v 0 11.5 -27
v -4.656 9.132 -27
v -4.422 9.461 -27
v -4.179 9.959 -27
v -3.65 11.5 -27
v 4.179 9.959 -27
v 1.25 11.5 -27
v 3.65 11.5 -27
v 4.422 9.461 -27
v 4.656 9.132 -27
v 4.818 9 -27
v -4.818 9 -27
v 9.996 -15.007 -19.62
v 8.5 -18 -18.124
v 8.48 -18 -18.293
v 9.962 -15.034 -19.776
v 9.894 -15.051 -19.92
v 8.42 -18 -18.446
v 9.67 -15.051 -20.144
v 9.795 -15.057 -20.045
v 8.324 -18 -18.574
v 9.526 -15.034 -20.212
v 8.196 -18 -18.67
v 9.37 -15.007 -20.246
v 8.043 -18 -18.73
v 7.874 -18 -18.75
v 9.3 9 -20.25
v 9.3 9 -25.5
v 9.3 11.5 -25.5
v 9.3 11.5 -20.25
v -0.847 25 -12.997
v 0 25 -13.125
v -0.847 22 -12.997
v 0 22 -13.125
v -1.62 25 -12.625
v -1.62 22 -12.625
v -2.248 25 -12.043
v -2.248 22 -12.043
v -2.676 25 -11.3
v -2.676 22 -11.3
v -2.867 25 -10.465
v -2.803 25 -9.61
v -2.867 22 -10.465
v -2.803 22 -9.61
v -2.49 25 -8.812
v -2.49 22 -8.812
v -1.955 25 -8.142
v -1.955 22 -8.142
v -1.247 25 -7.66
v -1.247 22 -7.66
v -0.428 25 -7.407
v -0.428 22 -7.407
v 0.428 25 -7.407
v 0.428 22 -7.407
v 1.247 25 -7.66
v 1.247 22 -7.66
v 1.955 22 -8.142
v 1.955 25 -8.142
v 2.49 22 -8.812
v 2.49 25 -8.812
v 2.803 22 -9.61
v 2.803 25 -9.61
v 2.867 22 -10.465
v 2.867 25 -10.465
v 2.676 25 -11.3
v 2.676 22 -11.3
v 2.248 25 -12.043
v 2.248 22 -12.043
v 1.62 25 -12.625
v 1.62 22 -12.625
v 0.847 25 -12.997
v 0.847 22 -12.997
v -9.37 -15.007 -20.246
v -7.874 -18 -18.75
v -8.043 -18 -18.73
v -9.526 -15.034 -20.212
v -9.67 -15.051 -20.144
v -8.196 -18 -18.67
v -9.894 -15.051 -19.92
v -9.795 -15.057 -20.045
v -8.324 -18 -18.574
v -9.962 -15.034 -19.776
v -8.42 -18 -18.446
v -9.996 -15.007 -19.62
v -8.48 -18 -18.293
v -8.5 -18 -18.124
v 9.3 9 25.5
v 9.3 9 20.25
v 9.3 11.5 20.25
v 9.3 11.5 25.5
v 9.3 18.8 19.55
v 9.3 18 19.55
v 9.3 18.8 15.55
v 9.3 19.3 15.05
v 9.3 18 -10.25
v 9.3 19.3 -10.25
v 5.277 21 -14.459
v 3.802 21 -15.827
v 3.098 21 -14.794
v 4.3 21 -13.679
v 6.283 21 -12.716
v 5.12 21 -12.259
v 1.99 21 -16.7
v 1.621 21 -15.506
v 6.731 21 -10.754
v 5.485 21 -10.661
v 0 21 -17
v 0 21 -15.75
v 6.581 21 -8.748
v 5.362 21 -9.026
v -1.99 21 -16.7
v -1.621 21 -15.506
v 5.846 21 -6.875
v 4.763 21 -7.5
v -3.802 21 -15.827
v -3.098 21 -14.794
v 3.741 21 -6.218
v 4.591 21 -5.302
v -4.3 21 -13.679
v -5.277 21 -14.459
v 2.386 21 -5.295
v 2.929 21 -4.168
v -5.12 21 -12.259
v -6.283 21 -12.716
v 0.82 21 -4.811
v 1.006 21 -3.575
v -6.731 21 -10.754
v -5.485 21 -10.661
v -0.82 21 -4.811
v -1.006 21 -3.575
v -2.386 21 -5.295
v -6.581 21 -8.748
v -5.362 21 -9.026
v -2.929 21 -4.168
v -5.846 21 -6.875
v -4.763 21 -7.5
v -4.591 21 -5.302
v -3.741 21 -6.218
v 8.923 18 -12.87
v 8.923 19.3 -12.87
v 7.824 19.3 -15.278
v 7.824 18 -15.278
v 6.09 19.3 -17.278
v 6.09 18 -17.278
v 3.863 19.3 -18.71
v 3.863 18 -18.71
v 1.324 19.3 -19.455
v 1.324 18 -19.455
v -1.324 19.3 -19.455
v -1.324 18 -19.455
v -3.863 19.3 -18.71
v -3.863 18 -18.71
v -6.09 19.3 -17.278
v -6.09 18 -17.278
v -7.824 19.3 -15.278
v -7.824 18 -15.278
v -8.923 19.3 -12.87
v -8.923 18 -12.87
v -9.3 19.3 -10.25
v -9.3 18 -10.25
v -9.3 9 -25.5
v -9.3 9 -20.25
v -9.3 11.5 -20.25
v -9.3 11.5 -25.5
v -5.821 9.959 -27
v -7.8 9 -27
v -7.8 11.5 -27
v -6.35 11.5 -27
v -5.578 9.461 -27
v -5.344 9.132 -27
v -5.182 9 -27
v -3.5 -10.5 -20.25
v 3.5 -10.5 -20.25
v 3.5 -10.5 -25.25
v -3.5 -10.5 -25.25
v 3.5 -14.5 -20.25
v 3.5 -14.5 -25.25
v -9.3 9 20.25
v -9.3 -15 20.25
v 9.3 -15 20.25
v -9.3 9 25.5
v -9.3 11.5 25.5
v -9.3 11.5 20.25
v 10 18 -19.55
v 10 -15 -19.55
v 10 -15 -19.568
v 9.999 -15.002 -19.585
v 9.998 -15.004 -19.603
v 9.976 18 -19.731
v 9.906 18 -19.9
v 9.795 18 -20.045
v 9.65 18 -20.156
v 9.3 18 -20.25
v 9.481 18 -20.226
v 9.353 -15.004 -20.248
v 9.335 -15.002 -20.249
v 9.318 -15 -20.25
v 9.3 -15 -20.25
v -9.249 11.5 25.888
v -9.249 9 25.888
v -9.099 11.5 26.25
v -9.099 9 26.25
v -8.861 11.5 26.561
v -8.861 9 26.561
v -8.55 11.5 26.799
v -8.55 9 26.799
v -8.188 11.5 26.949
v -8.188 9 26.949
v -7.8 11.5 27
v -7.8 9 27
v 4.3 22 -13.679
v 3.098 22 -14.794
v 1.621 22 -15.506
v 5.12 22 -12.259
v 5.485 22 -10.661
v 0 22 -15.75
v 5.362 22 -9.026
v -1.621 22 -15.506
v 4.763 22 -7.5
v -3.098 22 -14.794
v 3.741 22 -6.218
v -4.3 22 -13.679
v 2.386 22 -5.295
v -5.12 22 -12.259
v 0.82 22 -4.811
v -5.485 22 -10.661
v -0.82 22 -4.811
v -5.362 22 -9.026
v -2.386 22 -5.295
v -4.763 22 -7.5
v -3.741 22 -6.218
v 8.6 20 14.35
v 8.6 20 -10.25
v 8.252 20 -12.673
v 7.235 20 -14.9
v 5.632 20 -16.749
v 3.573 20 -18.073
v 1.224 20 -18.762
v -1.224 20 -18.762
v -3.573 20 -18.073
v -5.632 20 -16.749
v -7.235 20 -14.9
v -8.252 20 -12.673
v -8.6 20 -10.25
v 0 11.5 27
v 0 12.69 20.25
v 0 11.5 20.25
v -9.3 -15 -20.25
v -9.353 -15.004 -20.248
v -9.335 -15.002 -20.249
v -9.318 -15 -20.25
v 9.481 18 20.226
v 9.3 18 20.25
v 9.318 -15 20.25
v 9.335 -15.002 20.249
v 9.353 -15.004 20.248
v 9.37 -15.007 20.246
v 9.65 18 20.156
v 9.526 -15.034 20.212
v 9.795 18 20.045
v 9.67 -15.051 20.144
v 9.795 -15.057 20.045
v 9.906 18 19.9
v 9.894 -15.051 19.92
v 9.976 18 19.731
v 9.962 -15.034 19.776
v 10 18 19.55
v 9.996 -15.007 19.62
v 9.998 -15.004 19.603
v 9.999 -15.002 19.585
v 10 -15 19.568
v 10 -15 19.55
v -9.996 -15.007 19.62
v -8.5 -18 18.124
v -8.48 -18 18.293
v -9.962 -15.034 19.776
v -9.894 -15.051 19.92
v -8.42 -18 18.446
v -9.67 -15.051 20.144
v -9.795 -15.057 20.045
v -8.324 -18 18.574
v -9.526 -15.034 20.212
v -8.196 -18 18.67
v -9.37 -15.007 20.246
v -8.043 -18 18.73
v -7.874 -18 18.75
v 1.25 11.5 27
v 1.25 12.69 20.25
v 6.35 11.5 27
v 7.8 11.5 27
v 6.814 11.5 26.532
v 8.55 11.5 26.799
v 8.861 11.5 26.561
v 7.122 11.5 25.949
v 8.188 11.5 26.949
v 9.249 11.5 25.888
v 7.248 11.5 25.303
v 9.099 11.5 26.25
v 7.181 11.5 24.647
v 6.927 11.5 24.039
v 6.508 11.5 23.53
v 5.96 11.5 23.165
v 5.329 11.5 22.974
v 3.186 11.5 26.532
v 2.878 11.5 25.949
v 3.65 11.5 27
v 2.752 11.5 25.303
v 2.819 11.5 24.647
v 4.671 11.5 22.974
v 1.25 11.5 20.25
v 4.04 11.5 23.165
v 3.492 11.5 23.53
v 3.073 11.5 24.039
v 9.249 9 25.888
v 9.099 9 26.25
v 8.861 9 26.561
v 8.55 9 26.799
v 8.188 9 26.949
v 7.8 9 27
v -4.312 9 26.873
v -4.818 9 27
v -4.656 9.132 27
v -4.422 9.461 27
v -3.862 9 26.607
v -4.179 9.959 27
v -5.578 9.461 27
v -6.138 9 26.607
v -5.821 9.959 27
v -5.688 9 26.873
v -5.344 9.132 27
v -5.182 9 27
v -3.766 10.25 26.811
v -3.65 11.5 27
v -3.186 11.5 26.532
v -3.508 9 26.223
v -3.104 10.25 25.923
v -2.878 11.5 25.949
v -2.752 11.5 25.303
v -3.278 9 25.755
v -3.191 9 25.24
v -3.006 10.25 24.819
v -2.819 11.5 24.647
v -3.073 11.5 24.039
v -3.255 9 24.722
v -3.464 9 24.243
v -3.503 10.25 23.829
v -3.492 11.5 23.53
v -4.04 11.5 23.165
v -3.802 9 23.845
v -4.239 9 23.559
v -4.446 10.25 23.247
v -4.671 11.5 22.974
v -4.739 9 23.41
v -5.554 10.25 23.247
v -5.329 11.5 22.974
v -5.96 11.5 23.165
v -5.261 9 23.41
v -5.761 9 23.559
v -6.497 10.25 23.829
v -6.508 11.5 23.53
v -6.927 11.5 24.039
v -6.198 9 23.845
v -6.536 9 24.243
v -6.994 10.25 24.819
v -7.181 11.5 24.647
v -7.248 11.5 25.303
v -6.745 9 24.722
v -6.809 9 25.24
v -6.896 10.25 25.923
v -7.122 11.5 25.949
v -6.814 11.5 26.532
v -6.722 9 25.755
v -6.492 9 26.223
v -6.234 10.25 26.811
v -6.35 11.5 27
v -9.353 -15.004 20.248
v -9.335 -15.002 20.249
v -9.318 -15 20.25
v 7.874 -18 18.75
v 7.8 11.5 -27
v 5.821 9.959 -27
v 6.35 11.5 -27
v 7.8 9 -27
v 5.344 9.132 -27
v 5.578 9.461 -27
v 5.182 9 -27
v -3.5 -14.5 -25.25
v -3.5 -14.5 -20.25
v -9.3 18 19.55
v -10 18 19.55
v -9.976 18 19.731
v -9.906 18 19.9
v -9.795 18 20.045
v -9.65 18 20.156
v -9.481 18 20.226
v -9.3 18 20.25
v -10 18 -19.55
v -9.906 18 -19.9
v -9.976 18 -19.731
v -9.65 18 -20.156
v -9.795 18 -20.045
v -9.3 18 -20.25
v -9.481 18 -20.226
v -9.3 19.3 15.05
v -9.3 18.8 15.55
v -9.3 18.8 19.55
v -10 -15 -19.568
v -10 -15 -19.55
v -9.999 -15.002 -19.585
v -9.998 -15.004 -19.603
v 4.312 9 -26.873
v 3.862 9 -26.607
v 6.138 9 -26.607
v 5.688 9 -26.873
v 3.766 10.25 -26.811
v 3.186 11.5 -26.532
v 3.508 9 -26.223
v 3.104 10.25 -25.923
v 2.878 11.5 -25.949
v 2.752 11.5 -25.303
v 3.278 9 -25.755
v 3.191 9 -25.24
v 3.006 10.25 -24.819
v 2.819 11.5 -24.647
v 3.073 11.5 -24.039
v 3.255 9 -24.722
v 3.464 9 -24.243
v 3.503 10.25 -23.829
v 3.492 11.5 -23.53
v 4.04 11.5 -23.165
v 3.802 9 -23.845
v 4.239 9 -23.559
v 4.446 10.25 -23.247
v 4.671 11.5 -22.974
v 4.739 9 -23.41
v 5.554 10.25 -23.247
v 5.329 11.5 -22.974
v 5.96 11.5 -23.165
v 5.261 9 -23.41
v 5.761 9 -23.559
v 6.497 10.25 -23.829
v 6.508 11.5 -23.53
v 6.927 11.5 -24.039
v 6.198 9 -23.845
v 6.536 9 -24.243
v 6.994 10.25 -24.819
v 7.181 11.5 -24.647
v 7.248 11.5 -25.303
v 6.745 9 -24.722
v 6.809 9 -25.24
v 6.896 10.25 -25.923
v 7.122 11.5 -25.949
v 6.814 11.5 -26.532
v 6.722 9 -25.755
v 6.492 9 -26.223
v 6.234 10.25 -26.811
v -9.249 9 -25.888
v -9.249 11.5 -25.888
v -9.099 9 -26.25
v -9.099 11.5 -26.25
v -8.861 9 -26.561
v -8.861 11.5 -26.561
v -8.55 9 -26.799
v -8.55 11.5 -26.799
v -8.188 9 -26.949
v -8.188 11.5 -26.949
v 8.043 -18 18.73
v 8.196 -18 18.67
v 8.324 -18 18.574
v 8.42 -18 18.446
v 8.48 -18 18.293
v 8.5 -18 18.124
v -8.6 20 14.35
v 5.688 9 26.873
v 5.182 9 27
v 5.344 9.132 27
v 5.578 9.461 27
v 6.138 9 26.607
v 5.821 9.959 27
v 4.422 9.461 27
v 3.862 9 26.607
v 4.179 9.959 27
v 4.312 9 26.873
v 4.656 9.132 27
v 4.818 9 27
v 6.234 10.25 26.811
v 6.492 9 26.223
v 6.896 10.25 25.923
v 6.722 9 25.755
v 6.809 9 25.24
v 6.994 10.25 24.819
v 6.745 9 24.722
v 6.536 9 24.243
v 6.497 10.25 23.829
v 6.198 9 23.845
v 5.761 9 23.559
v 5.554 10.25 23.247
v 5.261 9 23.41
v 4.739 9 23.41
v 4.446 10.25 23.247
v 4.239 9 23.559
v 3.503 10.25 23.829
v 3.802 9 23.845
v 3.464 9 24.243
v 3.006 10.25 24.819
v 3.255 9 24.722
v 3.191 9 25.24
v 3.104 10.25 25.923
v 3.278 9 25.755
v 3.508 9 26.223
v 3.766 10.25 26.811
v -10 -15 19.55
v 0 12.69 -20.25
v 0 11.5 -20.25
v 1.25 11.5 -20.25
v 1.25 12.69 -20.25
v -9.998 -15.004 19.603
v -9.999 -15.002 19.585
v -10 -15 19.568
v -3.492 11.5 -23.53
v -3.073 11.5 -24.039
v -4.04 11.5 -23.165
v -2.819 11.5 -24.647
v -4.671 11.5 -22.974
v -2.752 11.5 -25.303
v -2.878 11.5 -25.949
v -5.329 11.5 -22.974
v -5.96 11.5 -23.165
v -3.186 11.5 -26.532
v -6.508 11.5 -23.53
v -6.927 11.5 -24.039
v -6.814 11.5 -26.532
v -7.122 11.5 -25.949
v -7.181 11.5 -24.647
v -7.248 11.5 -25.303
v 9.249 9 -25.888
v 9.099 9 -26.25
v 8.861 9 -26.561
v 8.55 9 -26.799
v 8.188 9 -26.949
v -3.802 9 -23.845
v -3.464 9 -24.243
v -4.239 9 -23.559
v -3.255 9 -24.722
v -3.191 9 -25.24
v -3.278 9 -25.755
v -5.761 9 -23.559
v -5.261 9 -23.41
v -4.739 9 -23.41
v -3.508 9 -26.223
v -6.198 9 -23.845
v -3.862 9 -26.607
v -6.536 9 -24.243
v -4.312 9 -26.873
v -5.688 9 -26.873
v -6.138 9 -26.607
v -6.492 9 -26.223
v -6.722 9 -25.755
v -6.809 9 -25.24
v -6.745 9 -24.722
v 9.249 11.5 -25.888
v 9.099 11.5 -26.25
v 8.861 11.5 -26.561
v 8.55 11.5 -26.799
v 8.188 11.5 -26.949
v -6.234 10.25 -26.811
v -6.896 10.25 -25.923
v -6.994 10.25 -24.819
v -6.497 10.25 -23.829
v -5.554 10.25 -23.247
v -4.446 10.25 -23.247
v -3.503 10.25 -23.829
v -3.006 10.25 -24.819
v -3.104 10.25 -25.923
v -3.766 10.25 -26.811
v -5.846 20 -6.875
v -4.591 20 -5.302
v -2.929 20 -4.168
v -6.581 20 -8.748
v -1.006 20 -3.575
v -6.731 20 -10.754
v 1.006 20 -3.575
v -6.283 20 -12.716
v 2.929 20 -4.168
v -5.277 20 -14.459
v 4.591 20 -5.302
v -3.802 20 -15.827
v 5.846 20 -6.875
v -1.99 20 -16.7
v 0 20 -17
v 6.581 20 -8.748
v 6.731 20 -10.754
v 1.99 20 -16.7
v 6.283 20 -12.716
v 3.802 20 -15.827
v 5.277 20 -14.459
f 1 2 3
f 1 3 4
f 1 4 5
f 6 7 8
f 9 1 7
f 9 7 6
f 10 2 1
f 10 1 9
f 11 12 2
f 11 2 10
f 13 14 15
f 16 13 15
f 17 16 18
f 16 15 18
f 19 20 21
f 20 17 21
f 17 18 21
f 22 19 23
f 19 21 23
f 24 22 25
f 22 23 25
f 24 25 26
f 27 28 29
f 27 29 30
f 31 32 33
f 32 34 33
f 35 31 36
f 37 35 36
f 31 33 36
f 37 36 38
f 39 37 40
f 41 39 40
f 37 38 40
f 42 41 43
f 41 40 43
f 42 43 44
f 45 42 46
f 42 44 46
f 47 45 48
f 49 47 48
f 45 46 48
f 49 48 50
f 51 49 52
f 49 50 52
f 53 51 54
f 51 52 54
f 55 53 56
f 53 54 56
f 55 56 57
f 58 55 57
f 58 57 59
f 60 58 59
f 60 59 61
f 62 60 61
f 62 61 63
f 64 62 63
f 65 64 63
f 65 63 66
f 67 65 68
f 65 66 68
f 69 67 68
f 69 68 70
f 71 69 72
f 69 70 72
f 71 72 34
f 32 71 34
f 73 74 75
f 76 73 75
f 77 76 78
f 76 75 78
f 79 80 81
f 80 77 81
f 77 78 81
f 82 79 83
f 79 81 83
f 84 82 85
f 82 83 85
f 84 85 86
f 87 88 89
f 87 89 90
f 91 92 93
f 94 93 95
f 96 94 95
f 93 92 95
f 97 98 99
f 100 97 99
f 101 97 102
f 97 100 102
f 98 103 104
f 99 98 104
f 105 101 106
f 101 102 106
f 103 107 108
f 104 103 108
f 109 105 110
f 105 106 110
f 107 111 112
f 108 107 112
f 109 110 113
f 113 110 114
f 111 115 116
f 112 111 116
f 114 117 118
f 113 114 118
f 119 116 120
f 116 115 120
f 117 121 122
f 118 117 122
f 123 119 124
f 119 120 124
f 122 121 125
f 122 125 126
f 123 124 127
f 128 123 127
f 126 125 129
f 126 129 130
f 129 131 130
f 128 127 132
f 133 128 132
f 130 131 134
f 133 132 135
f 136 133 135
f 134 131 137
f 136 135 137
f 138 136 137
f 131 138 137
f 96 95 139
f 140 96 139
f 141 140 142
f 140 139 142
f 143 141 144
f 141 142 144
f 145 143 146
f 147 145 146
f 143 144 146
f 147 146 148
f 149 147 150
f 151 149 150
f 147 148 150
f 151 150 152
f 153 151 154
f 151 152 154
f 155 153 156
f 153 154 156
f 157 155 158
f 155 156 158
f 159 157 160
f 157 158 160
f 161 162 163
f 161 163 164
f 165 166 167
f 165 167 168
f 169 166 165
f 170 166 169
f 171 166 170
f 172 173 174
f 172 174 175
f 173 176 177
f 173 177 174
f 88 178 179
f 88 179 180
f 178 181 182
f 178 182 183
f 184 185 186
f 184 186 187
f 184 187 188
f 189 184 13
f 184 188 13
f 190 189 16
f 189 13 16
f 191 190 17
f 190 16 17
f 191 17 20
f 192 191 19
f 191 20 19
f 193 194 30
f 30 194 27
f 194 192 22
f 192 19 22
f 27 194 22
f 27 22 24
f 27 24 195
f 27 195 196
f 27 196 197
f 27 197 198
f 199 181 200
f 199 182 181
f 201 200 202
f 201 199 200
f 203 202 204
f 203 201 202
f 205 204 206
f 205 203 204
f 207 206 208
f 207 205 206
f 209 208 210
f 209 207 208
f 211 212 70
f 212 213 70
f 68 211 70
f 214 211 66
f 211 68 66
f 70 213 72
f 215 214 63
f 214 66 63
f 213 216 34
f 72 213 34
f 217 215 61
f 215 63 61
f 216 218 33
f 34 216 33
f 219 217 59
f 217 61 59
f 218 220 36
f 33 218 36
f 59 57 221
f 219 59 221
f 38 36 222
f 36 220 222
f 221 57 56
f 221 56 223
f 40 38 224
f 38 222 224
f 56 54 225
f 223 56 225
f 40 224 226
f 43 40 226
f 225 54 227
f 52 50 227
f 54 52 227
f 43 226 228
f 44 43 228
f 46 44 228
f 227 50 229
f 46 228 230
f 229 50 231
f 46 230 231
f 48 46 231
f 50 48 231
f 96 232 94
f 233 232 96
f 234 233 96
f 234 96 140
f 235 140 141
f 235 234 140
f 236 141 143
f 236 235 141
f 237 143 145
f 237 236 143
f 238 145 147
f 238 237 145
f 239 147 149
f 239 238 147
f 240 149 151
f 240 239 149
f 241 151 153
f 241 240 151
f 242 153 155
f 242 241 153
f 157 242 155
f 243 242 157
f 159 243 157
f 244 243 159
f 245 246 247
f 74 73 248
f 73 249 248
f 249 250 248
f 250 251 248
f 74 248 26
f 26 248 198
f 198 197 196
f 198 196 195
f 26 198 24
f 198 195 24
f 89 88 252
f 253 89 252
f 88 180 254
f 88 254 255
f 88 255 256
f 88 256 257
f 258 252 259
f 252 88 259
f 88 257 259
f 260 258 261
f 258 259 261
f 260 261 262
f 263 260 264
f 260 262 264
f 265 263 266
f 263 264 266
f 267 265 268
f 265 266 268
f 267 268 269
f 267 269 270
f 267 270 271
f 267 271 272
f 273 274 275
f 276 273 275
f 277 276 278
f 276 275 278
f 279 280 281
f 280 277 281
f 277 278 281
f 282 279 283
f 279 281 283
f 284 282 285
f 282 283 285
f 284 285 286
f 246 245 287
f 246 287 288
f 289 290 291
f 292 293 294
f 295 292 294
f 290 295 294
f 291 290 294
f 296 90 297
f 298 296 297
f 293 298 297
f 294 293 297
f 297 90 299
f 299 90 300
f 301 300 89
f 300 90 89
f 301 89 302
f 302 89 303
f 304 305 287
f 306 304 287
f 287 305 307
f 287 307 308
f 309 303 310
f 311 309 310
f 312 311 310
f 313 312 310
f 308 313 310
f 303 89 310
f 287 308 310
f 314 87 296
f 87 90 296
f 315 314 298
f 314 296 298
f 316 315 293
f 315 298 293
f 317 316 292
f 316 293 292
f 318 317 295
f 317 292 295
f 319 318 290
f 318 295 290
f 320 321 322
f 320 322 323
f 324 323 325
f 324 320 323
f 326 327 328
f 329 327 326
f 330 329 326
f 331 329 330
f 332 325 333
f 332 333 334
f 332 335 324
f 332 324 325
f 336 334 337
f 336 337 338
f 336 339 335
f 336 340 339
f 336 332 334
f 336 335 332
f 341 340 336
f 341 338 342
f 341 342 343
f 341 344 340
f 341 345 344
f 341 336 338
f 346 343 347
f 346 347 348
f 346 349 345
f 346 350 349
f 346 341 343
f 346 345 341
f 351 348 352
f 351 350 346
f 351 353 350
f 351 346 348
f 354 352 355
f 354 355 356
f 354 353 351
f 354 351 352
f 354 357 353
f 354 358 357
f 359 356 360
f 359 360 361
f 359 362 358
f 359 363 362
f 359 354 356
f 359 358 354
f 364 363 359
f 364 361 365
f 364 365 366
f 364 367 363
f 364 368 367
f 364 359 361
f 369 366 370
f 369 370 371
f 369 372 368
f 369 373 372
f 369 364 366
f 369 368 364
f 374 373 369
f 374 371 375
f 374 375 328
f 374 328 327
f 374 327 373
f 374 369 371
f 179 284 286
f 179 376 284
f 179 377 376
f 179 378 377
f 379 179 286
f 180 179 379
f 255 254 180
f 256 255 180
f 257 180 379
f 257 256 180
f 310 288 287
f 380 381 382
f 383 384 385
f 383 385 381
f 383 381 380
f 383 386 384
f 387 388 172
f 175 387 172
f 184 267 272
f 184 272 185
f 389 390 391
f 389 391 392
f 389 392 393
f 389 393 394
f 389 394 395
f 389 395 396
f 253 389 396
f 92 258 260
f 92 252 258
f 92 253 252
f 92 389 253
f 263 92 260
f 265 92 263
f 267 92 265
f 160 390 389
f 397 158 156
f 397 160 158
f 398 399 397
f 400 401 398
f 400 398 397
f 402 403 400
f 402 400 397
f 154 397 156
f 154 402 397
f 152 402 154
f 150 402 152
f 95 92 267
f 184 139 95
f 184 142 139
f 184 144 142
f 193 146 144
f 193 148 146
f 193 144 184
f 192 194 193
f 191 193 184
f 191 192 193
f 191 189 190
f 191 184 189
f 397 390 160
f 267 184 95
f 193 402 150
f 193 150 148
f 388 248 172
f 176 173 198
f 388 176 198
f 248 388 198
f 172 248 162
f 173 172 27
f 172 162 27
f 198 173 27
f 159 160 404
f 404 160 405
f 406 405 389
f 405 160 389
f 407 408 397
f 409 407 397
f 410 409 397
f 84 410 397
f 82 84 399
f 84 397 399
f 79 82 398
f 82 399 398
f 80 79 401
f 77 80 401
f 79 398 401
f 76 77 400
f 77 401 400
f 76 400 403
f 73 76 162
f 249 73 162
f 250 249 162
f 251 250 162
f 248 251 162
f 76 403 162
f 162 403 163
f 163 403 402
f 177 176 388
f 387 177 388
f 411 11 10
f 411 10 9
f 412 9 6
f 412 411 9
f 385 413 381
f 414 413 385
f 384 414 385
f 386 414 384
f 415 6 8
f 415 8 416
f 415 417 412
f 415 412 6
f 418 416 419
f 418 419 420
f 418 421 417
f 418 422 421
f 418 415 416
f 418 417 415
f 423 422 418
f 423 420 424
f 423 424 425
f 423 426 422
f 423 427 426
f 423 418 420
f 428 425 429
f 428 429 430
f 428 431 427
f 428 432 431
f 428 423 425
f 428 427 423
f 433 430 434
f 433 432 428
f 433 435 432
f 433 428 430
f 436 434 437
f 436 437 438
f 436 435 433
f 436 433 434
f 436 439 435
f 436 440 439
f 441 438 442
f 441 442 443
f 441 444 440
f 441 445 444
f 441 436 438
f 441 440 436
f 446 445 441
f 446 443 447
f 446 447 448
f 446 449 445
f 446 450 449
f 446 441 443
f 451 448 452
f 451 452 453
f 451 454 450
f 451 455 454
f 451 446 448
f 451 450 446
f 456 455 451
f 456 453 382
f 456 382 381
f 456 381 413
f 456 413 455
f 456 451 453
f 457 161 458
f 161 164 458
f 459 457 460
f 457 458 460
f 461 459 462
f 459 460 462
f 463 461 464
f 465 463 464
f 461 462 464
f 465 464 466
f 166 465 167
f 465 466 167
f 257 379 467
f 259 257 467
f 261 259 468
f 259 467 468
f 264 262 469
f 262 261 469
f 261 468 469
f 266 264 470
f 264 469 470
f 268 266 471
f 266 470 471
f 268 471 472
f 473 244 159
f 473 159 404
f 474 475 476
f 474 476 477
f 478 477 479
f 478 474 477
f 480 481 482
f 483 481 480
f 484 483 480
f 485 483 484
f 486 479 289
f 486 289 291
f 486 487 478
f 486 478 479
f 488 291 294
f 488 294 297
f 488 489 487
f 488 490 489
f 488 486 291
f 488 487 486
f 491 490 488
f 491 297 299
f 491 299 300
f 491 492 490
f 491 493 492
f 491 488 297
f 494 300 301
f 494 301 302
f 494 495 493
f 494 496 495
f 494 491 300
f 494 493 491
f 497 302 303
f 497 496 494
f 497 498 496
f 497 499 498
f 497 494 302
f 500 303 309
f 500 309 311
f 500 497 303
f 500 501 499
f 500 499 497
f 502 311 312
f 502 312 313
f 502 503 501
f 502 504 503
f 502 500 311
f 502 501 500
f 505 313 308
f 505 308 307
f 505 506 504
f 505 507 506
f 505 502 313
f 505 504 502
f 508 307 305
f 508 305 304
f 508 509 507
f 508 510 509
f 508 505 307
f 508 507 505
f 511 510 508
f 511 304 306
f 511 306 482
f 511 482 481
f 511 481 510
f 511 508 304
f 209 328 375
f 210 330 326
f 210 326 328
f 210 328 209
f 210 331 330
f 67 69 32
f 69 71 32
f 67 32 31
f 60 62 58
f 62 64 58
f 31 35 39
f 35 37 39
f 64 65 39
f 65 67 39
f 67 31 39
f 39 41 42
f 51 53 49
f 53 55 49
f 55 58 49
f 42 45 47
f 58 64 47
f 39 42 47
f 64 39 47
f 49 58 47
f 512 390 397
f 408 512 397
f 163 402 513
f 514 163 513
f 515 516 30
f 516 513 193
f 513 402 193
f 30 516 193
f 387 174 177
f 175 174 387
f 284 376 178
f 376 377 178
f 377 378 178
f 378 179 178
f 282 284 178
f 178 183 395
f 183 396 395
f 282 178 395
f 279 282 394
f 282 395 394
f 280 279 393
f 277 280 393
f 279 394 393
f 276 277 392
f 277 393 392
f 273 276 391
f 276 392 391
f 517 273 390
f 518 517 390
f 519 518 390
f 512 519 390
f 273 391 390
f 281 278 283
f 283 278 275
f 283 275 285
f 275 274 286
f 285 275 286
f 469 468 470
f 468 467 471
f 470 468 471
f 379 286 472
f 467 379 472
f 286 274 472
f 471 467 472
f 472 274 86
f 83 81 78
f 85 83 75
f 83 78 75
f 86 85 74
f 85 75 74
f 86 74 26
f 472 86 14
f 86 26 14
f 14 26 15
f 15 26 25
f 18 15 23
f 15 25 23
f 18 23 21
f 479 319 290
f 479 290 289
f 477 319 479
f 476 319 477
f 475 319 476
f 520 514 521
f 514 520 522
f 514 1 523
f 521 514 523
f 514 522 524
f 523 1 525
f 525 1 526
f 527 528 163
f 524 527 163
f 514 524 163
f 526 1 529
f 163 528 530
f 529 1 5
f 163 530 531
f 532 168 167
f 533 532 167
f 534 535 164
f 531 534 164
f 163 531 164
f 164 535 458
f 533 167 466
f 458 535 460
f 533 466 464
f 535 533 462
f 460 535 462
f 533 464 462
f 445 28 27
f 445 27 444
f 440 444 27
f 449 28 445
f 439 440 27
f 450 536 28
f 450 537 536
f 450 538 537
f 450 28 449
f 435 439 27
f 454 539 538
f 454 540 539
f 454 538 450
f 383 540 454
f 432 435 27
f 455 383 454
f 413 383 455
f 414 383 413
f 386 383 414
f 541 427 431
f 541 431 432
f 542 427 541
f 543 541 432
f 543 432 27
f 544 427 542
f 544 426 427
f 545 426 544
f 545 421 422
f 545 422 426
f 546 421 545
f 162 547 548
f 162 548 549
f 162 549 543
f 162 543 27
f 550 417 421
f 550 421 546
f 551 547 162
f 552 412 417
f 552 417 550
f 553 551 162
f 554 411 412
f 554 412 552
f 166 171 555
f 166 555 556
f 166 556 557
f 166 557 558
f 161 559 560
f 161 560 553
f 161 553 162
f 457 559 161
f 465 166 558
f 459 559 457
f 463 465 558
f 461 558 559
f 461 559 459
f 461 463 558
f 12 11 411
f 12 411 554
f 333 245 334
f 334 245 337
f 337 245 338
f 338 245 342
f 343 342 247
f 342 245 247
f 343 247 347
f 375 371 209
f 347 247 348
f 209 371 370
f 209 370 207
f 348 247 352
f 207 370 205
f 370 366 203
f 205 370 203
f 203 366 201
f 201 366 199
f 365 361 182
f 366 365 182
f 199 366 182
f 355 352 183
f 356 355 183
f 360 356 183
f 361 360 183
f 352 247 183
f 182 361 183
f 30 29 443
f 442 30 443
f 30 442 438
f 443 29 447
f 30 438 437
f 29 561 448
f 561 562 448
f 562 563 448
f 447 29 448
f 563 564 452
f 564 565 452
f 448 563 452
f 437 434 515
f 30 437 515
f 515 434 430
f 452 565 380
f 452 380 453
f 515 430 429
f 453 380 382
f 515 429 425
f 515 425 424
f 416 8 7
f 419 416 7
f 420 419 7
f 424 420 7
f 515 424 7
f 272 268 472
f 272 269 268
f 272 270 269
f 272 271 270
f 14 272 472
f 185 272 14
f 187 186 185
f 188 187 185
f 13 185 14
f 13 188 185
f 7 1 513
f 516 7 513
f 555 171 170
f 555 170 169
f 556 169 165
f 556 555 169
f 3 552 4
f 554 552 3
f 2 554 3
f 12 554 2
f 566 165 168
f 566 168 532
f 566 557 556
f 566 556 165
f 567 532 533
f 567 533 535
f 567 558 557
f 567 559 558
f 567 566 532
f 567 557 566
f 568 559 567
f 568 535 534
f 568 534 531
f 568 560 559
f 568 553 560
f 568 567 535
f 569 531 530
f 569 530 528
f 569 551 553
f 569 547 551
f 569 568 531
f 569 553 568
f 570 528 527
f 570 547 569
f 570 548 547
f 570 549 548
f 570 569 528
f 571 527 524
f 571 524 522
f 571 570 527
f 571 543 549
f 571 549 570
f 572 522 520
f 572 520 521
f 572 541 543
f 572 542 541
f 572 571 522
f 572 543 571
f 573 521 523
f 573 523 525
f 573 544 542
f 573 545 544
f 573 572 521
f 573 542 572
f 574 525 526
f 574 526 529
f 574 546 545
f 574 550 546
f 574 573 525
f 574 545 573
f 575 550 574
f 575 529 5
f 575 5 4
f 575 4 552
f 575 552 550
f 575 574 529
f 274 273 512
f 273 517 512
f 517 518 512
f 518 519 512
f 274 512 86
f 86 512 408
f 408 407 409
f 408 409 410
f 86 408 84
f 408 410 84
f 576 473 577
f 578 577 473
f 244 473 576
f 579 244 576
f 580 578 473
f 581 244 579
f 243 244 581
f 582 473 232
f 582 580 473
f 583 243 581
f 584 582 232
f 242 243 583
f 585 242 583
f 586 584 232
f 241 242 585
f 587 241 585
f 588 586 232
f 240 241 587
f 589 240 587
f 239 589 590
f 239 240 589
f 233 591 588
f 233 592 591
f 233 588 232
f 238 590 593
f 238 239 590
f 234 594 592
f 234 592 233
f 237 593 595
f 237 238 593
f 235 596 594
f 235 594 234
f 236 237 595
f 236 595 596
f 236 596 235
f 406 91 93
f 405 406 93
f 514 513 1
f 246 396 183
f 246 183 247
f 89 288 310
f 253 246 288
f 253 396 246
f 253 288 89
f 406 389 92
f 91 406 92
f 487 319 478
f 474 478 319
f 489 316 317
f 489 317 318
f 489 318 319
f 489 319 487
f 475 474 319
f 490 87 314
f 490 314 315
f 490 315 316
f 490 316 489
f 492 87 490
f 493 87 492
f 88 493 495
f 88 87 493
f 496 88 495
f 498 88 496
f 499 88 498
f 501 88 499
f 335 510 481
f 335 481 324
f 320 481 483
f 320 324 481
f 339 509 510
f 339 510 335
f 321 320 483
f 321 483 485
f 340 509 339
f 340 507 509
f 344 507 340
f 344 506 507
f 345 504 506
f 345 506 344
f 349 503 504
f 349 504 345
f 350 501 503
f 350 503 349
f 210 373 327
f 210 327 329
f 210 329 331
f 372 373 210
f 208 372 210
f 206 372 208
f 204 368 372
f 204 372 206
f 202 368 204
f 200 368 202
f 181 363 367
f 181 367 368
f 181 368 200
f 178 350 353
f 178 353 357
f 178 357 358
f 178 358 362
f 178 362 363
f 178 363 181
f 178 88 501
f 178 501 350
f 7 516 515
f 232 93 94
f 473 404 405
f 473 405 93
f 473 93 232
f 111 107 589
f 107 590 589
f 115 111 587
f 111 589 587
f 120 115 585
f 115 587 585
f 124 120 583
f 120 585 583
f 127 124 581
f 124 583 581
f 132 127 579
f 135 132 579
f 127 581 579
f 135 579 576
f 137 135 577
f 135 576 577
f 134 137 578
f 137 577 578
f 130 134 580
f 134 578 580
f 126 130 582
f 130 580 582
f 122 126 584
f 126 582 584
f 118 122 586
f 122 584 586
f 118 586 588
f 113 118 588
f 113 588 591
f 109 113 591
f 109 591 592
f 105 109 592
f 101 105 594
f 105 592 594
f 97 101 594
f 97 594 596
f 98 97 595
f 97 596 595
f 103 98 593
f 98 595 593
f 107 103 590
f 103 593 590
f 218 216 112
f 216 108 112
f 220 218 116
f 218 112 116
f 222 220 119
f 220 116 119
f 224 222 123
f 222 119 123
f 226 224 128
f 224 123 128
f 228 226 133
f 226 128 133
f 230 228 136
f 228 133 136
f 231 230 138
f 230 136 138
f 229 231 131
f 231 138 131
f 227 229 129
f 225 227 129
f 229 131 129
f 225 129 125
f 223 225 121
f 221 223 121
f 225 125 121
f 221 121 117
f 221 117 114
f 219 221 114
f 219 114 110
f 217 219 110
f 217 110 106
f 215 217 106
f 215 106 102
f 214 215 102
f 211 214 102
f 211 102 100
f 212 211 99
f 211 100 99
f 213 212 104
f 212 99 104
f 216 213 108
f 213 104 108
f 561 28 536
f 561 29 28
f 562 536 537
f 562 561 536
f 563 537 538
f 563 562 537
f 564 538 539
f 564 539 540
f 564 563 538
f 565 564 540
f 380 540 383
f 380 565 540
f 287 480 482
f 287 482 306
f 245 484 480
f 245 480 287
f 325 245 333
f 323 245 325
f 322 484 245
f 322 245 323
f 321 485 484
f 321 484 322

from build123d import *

# Parameters (mm, degrees)
SKETCH1_W               = 20
SKETCH1_H               = 40.5
BOSS_EXTRUDE1_DEPTH     = 18
BOSS_EXTRUDE2_DEPTH     = 2
BOSS_EXTRUDE3_DEPTH     = 2.5
FILLET1_R               = 1.5
BOSS_EXTRUDE4_DEPTH     = 1.25
DRAFT1_ANGLE            = 10
SKETCH7_W               = 7
SKETCH7_H               = 4
BOSS_EXTRUDE5_DEPTH     = 5
CUT_EXTRUDE1_DEPTH      = 39.13135193
CUT_EXTRUDE1_DEPTH_BACK = 39.13135193
CHAMFER1_SIZE           = 0.7
CHAMFER2_SIZE           = 1.5
CHAMFER2_SIZE2          = 3
FILLET2_R               = 0.7


with BuildPart() as part:
    # Sketch1 → Boss-Extrude1 (new, symmetric)
    with BuildSketch(Plane(origin=(0, 0, 0), x_dir=(1, 0, 0), z_dir=(0, 1, 0))):
        Rectangle(SKETCH1_W, SKETCH1_H)
    extrude(amount=BOSS_EXTRUDE1_DEPTH, both=True)

    # Sketch2 → Boss-Extrude2 (add)
    with BuildSketch(Plane(origin=(0, 18, 0), x_dir=(1, 0, 0), z_dir=(0, 1, 0))):
        with BuildLine():
            Line((-9.3, 10.25), (-9.3, -19.55))
            Line((-9.3, -19.55), (9.3, -19.55))
            Line((9.3, -19.55), (9.3, 10.25))
            ThreePointArc((9.3, 10.25), (0, 19.55), (-9.3, 10.25))
        make_face()
    extrude(amount=BOSS_EXTRUDE2_DEPTH)

    # Sketch4 → Revolve1 (revolve)
    with BuildSketch(Plane(origin=(0, 0, 0), x_dir=(0, 0, -1), z_dir=(1, 0, 0))):
        Polygon((10.25, 20), (10.25, 25), (13.125, 25), (13.125, 22), (15.75, 22), (15.75, 21), (17, 21), (17, 20), align=None)
    revolve(axis=Axis((0, 20, -10.25), (0, 1, 0)))

    # Sketch5 → Boss-Extrude3 (add)
    with BuildSketch(Plane(origin=(0, 9, 0), x_dir=(-1, 0, 0), z_dir=(0, -1, 0))):
        with BuildLine():
            Line((-9.3, 20.25), (9.3, 20.25))
            Line((9.3, 20.25), (9.3, 27))
            Line((9.3, 27), (6.35, 27))
            ThreePointArc((6.35, 27), (5, 22.95), (3.65, 27))
            Line((3.65, 27), (-3.65, 27))
            ThreePointArc((-3.65, 27), (-5, 22.95), (-6.35, 27))
            Line((-6.35, 27), (-9.3, 27))
            Line((-9.3, 27), (-9.3, 20.25))
        make_face()
        with BuildLine():
            Line((9.3, -20.25), (-9.3, -20.25))
            Line((-9.3, -20.25), (-9.3, -27))
            Line((-9.3, -27), (-6.35, -27))
            ThreePointArc((-6.35, -27), (-5, -22.95), (-3.65, -27))
            Line((-3.65, -27), (3.65, -27))
            ThreePointArc((3.65, -27), (5, -22.95), (6.35, -27))
            Line((6.35, -27), (9.3, -27))
            Line((9.3, -27), (9.3, -20.25))
        make_face()
    extrude(amount=-BOSS_EXTRUDE3_DEPTH)

    # Fillet1
    fillet1_edges = [part.edges().sort_by_distance(p)[0] for p in [
        (-9.3, 10.25, -27),
        (9.3, 10.25, -27),
        (9.3, 10.25, 27),
        (-9.3, 10.25, 27),
    ]]
    fillet(fillet1_edges, radius=FILLET1_R)

    # Sketch6 → Boss-Extrude4 (add)
    with BuildSketch(Plane(origin=(0, 0, 0), x_dir=(0, 0, -1), z_dir=(1, 0, 0))):
        Polygon((20.25, 11.5), (27, 11.5), (20.25, 12.69020712), align=None)
        Polygon((-20.25, 12.69020712), (-20.25, 11.5), (-27, 11.5), align=None)
    extrude(amount=BOSS_EXTRUDE4_DEPTH)

    # Draft1
    draft1_faces = [part.faces().sort_by_distance(p)[0] for p in [
        (5, 10.25, 22.95),
        (-5, 10.25, 22.95),
        (-5, 10.25, -22.95),
        (5, 10.25, -22.95),
    ]]
    draft(draft1_faces, Plane.ZX.offset(11.5), DRAFT1_ANGLE)

    # Sketch7 → Boss-Extrude5 (add)
    with BuildSketch(Plane(origin=(0, 0, -20.25), x_dir=(-1, 0, 0), z_dir=(0, 0, -1))):
        with Locations((0, -12.5)):
            Rectangle(SKETCH7_W, SKETCH7_H)
    extrude(amount=BOSS_EXTRUDE5_DEPTH)

    # Sketch8 → Cut-Extrude1 (cut, two sides: drawn at the far end of the back side and taken through both)
    with BuildSketch(Plane(origin=(0, 0, 0), x_dir=(0, 0, -1), z_dir=(1, 0, 0)).offset(-CUT_EXTRUDE1_DEPTH_BACK)):
        Polygon((-19.55, 18.8), (-15.55, 18.8), (-14.35, 20), (-19.55, 20), align=None)
    extrude(amount=CUT_EXTRUDE1_DEPTH + CUT_EXTRUDE1_DEPTH_BACK, mode=Mode.SUBTRACT)

    # Chamfer1
    chamfer1_edges = [part.edges().sort_by_distance(p)[0] for p in [
        (9.3, 20, 2.05),
        (0, 20, -19.55),
        (-9.3, 20, 2.05),
    ]]
    chamfer(chamfer1_edges, length=CHAMFER1_SIZE)

    # Chamfer2
    chamfer2_edges = [part.edges().sort_by_distance(p)[0] for p in [
        (0, -18, 20.25),
        (-10, -18, 0),
        (0, -18, -20.25),
        (10, -18, 0),
    ]]
    chamfer2_side = [part.faces().sort_by_distance(p)[0] for p in [
        (0, -18, 0),
    ]]
    chamfer(chamfer2_edges, length=CHAMFER2_SIZE, length2=CHAMFER2_SIZE2, reference=chamfer2_side[0])

    # Fillet2
    # the kernel refuses this fillet: 0.7 mm, written as the material it takes off along each edge
    with BuildSketch(Plane(origin=(7.916666667, -19.166666667, 18.166666667), x_dir=(-0.9128709291752769, 0.365148371670112, 0.1825741858350529), z_dir=(0.4082482904638631, 0.8164965809277261, 0.4082482904638631)), Plane(origin=(7.916666667, -19.166666667, -18.166666667), x_dir=(0.18257418583505539, 0.36514837167011077, 0.9128709291752769), z_dir=(0.4082482904638631, 0.8164965809277261, -0.4082482904638631))) as fillet2_piece_1:
        with BuildLine():
            CenterArc((FILLET2_R * 0.816496580928, -FILLET2_R), FILLET2_R, 90, 78.463040967)
            Line((-FILLET2_R * 0.163299316186, -FILLET2_R * 0.8), (0, 0))
            Line((0, 0), (FILLET2_R * 0.816496580928, 0))
        make_face()
    extrude(amount=6.531972647, mode=Mode.SUBTRACT)
    with BuildSketch(Plane(origin=(-7.916666667, -19.166666667, 18.166666667), x_dir=(0.9128709291752769, 0.3651483716701107, 0.18257418583505536), z_dir=(-0.4082482904638631, 0.8164965809277261, 0.4082482904638631)), Plane(origin=(-7.916666667, -19.166666667, -18.166666667), x_dir=(-0.18257418583505539, 0.36514837167011077, 0.9128709291752769), z_dir=(-0.4082482904638631, 0.8164965809277261, -0.4082482904638631))) as fillet2_piece_2:
        with BuildLine():
            CenterArc((FILLET2_R * 0.816496580928, FILLET2_R), FILLET2_R, 191.536959033, 78.463040967)
            Line((-FILLET2_R * 0.163299316186, FILLET2_R * 0.8), (0, 0))
            Line((0, 0), (FILLET2_R * 0.816496580928, 0))
        make_face()
    extrude(amount=6.531972647, mode=Mode.SUBTRACT)
    with BuildSketch(Plane(origin=(10, -16.75, 20.25), x_dir=(-1, 0, 0), z_dir=(0, 1, 0)), Plane(origin=(-10, 19.75, 20.25), x_dir=(1, 0, 0), z_dir=(0, -1, 0)), Plane(origin=(-10, 19.75, -20.25), x_dir=(0, 0, 1), z_dir=(0, -1, 0)), Plane(origin=(10, -16.75, -20.25), x_dir=(0, 0, 1), z_dir=(0, 1, 0))) as fillet2_piece_3:
        with BuildLine():
            CenterArc((FILLET2_R, -FILLET2_R), FILLET2_R, 90, 90)
            Line((0, -FILLET2_R), (0, 0))
            Line((0, 0), (FILLET2_R, 0))
        make_face()
    extrude(amount=36.5, mode=Mode.SUBTRACT)


solid = part.part
